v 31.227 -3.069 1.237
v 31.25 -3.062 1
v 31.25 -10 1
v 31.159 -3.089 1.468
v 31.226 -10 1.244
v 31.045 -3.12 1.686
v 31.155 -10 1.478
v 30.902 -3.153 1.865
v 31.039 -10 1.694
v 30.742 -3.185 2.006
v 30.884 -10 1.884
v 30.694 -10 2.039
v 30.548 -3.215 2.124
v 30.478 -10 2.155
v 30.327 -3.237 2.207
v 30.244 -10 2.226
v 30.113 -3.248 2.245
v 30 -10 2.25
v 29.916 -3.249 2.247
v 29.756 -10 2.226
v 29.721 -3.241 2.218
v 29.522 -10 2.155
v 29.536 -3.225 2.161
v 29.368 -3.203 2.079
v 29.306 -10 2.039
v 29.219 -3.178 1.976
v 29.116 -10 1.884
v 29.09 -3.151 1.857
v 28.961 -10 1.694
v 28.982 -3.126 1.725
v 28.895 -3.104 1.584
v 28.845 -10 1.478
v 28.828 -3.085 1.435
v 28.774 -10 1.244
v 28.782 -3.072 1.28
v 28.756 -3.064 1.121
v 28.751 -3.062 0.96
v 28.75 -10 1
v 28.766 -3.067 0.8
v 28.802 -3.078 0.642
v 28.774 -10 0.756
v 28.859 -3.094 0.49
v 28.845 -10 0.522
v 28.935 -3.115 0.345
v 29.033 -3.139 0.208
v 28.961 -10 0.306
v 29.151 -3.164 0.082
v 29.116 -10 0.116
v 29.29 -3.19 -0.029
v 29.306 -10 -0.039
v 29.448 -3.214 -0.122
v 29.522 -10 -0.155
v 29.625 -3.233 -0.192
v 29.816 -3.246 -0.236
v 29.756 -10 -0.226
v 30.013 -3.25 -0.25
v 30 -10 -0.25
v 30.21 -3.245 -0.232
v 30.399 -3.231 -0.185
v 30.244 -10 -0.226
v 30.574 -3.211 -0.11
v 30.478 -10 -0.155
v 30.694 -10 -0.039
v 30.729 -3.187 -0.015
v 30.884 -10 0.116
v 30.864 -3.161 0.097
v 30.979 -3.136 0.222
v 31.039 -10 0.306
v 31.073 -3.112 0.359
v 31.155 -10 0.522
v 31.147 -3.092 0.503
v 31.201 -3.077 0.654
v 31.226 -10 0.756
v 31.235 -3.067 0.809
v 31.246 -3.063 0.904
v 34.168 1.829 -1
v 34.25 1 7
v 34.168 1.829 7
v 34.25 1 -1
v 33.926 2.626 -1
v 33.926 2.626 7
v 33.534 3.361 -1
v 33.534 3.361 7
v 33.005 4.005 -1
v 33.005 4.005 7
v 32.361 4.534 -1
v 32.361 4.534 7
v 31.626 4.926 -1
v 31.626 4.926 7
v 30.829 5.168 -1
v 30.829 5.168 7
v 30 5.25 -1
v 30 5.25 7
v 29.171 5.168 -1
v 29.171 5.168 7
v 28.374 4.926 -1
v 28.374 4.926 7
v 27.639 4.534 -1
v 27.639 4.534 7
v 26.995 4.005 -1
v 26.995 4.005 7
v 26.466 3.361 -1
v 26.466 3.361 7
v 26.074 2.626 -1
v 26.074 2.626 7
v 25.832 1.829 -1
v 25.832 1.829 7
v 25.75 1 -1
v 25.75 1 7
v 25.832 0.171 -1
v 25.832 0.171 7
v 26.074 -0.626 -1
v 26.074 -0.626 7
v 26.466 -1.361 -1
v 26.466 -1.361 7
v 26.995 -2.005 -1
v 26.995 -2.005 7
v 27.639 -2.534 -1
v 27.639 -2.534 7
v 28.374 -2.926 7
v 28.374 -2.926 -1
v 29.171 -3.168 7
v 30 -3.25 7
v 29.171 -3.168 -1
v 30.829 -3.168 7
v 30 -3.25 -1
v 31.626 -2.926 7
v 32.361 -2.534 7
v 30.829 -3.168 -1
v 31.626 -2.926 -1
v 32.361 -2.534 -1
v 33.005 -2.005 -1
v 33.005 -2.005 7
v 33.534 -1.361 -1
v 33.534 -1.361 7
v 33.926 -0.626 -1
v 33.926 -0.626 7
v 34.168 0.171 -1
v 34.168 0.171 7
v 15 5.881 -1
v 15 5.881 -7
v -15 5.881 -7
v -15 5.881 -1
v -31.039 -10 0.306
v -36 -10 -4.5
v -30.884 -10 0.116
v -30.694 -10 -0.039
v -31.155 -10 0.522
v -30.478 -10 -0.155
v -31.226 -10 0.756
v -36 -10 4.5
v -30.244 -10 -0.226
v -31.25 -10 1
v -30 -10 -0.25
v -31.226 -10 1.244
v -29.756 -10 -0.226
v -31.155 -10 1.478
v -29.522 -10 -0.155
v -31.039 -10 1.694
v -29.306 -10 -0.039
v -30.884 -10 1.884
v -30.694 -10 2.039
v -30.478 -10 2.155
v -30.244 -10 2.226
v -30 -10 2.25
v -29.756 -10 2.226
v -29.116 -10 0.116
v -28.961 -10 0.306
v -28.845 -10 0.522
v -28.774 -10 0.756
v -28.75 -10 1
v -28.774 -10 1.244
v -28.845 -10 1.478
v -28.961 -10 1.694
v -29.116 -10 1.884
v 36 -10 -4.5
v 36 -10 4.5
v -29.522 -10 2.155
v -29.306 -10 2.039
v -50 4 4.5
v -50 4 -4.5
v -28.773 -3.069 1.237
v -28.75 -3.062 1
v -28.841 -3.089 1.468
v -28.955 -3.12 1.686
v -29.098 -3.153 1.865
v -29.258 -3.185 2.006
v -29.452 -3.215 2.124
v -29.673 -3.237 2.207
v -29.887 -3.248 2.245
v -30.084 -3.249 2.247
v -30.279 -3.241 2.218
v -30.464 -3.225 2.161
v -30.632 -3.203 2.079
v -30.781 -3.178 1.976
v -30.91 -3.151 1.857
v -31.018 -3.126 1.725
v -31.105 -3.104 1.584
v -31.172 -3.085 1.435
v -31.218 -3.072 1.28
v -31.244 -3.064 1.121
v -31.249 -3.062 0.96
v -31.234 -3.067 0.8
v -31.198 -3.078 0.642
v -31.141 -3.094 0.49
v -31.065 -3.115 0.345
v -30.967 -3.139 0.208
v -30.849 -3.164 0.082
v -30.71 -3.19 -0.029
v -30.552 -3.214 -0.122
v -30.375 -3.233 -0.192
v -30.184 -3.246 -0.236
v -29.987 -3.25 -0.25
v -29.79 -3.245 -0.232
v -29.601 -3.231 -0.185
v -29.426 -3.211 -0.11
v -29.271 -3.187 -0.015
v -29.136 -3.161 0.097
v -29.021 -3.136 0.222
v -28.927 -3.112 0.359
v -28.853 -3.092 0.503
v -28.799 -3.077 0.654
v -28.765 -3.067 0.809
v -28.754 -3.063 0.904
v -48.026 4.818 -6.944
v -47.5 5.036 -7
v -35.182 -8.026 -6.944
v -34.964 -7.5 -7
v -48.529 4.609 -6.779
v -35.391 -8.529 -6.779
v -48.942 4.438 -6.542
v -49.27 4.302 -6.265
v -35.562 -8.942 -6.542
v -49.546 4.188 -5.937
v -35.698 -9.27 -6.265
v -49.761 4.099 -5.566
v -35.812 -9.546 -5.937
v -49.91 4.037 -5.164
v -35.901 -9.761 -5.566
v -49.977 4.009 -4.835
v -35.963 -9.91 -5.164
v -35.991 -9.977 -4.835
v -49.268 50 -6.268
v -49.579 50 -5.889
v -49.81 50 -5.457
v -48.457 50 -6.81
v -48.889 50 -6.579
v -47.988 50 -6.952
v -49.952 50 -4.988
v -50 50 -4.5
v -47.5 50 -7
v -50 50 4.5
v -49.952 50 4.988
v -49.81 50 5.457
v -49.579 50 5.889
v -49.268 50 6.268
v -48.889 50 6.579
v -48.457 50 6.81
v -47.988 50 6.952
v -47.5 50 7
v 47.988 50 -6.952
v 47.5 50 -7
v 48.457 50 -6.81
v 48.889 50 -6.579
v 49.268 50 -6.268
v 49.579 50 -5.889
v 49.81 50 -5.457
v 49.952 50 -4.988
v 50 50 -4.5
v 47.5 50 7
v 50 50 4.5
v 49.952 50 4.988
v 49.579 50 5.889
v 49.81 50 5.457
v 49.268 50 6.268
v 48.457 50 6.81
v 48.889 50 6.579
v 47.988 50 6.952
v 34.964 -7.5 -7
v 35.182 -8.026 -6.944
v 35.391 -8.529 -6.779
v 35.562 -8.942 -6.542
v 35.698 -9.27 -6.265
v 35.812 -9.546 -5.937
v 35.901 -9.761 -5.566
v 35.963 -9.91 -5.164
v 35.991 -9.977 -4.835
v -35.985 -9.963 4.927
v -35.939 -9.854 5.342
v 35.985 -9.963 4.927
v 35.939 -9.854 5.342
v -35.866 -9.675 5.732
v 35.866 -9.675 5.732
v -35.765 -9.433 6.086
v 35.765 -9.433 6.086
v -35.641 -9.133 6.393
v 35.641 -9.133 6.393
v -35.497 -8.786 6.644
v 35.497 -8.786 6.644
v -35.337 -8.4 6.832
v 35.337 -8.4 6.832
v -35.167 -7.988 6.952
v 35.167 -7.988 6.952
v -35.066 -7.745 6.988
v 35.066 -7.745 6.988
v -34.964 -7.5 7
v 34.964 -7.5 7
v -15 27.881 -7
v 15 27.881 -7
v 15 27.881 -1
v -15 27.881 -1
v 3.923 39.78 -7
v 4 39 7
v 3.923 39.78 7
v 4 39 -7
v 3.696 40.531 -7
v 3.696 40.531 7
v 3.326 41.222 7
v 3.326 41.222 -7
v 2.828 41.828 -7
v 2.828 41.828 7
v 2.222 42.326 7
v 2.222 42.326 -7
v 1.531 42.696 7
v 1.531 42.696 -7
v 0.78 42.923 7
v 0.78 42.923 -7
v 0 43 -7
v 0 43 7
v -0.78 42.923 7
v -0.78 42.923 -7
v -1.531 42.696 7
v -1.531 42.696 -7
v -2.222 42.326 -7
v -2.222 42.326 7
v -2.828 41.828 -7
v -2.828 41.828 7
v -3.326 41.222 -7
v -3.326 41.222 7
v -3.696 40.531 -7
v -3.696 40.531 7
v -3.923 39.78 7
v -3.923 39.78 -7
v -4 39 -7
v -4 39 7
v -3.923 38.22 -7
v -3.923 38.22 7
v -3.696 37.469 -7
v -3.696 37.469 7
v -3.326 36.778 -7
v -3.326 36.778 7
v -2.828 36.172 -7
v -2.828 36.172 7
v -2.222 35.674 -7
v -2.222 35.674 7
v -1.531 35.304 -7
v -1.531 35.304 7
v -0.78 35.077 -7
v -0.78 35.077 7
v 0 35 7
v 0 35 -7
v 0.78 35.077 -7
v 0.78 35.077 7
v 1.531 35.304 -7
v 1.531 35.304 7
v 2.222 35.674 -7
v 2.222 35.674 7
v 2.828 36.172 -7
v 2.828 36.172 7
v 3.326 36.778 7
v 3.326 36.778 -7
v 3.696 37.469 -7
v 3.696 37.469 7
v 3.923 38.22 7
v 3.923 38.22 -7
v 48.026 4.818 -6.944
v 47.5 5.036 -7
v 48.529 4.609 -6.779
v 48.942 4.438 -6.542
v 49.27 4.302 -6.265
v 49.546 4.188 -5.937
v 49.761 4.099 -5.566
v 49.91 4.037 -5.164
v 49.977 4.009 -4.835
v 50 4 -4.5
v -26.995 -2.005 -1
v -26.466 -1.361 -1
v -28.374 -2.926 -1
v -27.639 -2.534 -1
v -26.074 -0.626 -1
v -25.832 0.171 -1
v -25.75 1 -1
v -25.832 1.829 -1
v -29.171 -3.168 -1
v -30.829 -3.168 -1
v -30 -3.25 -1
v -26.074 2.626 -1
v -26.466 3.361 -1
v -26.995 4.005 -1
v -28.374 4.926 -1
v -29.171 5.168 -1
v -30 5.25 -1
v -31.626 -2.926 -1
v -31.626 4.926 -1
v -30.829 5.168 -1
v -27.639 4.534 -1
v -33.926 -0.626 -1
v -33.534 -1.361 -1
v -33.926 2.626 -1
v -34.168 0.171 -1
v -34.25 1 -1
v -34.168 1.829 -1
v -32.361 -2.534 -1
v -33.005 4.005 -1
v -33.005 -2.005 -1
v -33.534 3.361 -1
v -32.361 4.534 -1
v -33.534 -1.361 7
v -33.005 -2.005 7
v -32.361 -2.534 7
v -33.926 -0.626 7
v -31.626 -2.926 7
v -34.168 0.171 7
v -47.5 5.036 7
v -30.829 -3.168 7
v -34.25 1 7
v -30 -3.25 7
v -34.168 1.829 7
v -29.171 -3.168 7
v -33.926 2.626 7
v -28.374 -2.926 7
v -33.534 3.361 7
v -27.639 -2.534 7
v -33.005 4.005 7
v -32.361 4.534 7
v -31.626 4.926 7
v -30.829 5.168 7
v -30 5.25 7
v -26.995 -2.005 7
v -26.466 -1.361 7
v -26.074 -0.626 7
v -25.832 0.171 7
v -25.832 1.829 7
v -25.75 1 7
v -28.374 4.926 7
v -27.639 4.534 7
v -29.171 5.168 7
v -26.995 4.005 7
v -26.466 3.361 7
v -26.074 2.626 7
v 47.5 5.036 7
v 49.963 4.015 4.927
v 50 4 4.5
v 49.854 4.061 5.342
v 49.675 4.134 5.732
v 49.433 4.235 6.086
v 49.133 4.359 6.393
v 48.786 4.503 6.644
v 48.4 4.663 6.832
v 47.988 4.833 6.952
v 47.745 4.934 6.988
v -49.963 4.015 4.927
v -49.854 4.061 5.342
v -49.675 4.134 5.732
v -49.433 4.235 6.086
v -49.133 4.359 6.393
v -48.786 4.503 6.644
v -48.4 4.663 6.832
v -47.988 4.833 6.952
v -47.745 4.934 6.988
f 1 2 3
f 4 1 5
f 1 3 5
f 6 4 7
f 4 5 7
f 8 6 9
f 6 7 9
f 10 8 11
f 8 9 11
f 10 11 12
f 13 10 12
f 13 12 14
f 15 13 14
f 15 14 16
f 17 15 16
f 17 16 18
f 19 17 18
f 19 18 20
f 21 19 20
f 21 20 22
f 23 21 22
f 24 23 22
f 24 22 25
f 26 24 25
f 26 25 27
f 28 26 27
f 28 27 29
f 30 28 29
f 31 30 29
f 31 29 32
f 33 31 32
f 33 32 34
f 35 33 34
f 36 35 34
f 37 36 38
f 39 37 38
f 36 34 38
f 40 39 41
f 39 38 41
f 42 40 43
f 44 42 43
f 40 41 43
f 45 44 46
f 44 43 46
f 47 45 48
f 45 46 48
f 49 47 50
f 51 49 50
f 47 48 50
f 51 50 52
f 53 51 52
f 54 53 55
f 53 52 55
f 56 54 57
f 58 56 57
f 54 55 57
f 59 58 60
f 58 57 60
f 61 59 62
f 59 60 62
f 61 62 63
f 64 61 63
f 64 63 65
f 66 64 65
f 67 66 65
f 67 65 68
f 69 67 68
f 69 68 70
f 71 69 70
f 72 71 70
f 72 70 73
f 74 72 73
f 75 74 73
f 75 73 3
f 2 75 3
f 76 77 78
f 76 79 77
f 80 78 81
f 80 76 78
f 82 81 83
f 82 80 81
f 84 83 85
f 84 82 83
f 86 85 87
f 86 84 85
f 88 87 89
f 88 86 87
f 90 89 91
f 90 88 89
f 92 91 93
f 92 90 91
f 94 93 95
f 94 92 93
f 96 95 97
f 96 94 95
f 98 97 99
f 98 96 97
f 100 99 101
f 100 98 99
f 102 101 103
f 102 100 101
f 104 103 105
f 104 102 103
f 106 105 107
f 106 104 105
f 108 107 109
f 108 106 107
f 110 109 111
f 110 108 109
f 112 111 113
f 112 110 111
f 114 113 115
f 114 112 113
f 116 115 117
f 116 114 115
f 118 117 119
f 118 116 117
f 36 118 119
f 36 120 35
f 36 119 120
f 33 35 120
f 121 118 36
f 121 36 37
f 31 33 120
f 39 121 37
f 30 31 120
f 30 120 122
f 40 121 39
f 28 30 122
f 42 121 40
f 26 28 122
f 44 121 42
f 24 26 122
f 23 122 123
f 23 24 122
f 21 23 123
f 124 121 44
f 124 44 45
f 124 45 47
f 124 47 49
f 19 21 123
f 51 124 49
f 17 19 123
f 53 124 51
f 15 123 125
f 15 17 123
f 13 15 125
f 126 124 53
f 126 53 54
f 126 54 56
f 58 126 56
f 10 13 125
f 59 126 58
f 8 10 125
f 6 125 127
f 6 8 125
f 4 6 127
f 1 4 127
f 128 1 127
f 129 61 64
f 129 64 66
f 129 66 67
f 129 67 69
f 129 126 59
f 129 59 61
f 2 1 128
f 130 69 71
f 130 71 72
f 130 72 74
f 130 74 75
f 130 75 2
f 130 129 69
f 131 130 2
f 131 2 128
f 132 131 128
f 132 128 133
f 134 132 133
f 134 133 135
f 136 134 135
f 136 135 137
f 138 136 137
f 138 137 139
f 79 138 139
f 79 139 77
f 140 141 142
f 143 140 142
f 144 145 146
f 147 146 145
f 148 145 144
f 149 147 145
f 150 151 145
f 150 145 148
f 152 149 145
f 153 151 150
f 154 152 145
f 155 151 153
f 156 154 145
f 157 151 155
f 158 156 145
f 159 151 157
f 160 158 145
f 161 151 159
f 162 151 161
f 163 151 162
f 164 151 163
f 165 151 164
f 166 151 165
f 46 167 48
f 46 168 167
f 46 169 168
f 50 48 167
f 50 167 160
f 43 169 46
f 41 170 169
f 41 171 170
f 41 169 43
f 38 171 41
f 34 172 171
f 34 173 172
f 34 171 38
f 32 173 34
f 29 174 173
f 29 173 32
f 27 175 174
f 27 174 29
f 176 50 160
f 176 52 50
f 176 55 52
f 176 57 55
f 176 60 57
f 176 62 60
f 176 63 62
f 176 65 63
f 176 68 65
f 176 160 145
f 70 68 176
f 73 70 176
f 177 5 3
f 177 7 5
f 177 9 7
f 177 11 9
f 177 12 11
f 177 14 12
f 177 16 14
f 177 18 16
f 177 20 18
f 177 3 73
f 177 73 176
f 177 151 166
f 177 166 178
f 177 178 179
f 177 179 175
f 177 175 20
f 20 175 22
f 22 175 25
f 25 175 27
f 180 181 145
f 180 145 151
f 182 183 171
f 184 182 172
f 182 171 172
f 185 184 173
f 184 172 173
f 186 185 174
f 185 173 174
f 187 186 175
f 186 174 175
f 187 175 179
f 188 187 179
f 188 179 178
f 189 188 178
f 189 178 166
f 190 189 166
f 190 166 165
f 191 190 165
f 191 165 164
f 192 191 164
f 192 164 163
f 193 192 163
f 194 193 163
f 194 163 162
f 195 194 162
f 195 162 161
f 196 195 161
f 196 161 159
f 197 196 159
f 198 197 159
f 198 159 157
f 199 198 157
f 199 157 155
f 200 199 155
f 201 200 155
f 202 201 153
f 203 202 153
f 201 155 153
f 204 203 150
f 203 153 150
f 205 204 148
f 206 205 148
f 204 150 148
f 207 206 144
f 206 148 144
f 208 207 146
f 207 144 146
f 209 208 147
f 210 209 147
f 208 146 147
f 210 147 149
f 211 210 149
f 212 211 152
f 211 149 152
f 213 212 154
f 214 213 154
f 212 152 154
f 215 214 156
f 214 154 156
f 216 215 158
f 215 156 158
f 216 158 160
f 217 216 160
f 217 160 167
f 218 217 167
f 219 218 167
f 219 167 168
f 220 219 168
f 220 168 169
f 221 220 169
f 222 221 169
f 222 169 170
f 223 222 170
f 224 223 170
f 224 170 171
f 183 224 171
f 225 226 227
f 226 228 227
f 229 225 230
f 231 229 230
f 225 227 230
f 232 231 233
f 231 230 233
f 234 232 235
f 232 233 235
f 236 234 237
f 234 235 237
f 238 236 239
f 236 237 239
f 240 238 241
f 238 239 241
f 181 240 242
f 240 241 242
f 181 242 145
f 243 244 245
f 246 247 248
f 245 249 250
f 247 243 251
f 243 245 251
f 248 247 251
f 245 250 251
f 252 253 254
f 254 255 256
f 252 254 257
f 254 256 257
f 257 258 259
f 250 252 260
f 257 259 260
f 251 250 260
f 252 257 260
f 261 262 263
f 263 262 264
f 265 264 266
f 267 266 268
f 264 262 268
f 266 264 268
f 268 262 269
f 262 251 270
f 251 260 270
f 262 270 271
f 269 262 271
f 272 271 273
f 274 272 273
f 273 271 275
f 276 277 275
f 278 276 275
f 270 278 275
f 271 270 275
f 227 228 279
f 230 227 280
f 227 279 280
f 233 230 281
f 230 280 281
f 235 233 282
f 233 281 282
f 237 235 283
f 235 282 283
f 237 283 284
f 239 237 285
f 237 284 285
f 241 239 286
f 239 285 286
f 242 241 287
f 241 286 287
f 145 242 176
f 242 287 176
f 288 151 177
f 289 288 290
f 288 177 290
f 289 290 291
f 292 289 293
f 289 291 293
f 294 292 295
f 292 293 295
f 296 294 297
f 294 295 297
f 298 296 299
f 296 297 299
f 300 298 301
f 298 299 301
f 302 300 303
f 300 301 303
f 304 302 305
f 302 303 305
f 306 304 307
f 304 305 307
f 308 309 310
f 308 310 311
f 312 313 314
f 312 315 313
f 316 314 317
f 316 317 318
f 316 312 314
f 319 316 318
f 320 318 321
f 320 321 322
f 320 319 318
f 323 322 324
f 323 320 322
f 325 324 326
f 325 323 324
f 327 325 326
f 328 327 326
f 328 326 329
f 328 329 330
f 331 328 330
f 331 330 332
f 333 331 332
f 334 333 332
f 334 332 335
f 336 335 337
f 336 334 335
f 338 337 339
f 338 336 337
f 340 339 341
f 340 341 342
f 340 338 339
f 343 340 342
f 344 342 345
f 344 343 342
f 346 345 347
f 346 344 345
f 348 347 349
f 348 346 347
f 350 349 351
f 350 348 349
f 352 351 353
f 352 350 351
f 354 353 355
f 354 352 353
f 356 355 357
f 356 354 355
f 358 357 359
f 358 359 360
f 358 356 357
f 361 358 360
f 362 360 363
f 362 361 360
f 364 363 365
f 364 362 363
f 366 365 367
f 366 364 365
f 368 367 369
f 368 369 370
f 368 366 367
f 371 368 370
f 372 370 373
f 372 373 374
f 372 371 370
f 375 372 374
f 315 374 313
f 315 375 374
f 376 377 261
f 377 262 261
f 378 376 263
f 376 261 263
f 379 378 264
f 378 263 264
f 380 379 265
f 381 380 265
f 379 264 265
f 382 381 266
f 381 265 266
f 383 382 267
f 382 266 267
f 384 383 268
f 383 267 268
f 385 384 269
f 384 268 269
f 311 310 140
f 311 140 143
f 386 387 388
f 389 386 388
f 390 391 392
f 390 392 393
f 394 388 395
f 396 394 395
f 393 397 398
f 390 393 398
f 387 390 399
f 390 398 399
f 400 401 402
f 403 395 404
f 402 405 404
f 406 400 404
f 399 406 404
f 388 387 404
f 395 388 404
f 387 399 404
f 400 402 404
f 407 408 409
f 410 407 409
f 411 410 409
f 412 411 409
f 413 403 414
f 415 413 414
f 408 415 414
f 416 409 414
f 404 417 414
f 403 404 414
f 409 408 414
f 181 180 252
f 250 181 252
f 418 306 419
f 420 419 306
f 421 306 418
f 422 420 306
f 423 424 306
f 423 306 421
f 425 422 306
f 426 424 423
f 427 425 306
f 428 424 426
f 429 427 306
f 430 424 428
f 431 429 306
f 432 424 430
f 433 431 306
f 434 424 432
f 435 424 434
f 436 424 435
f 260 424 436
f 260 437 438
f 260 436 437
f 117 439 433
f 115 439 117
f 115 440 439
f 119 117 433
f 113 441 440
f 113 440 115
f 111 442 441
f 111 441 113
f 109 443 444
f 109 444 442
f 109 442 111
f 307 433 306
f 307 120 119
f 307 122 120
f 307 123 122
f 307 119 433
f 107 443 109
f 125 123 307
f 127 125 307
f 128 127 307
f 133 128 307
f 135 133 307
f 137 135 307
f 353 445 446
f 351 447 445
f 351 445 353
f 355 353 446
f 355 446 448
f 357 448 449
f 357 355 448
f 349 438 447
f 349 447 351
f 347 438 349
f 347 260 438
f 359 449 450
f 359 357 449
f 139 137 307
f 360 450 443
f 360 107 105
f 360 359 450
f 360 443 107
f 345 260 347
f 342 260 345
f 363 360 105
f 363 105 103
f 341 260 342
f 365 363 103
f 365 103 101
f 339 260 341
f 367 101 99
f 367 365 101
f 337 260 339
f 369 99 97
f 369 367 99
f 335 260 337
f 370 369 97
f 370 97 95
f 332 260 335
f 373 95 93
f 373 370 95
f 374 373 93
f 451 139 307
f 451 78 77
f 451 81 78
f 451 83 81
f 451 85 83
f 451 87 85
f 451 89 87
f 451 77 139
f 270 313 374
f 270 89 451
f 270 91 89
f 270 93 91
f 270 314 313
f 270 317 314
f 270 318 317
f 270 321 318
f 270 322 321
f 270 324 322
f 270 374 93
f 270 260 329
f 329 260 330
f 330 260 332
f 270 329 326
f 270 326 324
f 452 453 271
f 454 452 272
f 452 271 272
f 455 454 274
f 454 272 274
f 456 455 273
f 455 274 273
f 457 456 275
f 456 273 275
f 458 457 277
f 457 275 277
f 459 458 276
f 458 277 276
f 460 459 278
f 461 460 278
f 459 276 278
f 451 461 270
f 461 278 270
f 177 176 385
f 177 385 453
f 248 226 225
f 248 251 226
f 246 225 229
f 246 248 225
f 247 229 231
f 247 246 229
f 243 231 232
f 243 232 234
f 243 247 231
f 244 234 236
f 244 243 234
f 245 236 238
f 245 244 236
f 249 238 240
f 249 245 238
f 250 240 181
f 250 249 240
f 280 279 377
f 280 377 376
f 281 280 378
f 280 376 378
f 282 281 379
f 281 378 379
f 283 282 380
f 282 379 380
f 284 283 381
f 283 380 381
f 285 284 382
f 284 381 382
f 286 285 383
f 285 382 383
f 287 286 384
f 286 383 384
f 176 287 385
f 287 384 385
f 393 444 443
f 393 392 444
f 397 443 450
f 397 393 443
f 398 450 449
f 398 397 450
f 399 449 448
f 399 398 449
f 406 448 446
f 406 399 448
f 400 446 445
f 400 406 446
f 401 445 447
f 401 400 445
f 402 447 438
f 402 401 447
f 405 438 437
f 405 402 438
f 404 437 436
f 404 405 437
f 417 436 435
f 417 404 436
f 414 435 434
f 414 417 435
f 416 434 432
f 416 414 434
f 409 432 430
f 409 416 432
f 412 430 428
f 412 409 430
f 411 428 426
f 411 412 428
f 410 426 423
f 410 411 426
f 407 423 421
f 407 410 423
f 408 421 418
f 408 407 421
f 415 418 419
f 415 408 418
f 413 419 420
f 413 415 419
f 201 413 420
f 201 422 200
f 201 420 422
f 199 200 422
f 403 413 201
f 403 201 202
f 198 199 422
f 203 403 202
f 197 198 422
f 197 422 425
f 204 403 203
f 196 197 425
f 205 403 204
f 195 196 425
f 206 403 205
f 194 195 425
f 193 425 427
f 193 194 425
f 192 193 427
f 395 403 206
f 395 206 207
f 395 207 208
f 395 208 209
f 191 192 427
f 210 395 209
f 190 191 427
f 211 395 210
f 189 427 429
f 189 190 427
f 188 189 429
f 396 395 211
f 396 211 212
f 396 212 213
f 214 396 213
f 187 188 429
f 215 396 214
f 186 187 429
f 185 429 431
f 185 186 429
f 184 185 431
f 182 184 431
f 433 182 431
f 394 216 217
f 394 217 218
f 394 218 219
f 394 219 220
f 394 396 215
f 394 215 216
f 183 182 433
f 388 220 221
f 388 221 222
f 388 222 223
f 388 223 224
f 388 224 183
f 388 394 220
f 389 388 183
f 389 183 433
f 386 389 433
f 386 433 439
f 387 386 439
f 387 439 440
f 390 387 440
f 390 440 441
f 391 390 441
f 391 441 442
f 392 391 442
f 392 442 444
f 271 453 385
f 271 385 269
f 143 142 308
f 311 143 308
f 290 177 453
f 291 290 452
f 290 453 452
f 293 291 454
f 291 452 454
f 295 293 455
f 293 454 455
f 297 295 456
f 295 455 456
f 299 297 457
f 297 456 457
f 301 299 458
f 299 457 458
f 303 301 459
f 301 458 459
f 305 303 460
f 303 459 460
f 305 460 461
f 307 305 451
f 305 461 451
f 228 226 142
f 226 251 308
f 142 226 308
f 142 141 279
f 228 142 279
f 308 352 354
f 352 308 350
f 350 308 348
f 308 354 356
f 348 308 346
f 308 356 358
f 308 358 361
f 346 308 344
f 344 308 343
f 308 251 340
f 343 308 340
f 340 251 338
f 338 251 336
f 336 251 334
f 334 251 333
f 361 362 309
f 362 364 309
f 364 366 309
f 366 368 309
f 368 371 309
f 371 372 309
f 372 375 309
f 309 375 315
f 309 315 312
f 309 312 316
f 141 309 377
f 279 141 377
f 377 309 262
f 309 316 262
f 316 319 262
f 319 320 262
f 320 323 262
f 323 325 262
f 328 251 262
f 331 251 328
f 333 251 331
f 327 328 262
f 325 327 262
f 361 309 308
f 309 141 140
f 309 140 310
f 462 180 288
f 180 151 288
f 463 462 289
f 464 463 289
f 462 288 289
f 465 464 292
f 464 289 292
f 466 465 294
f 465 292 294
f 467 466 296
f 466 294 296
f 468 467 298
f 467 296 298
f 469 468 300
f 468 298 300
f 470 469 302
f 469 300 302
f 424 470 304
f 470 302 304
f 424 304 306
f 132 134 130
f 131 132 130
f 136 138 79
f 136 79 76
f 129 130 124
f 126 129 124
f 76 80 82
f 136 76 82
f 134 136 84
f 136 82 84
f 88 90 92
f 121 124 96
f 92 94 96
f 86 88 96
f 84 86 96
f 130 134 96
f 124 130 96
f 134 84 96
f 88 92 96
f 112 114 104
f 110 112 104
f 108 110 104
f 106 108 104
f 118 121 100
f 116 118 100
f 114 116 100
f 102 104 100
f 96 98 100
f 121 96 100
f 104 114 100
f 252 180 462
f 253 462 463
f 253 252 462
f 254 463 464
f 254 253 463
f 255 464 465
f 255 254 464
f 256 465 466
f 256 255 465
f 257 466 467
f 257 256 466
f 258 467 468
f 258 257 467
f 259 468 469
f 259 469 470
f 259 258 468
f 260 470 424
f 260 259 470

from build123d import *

# Parameters (mm, degrees)
SKETCH1_W           = 100
SKETCH1_H           = 60
SKETCH1_R           = 4.25
SKETCH1_R_2         = 4
BOSS_EXTRUDE1_DEPTH = 7
SKETCH2_R           = 6.457332118
BOSS_EXTRUDE2_DEPTH = 6
CHAMFER1_SIZE       = 14
FILLET2_R           = 2.5
SKETCH3_W           = 30
SKETCH3_H           = 22
CUT_EXTRUDE1_DEPTH  = 6
SKETCH4_R           = 1.25
CUT_EXTRUDE2_DEPTH  = 12


with BuildPart() as part:
    # Sketch1 → Boss-Extrude1 (new body, symmetric)
    with BuildSketch(Plane.XY):
        with Locations((0, 20)):
            Rectangle(SKETCH1_W, SKETCH1_H)
        with Locations((30, 1)):
            Circle(SKETCH1_R, mode=Mode.SUBTRACT)
        with Locations((-30, 1)):
            Circle(SKETCH1_R, mode=Mode.SUBTRACT)
        with Locations((0, 39)):
            Circle(SKETCH1_R_2, mode=Mode.SUBTRACT)
    extrude(amount=BOSS_EXTRUDE1_DEPTH, both=True)

    # Sketch2 → Boss-Extrude2 (add)
    with BuildSketch(Plane(origin=(0, 0, -7), x_dir=(-1, 0, 0), z_dir=(0, 0, -1))):
        with Locations((-30, 1)):
            Circle(SKETCH2_R)
        with Locations((30, 1)):
            Circle(SKETCH2_R)
    extrude(amount=-BOSS_EXTRUDE2_DEPTH)

    # Chamfer1
    chamfer1_edges = [part.edges().sort_by_distance(p)[0] for p in [
        (50, -10, 0),
        (-50, -10, 0),
    ]]
    chamfer(chamfer1_edges, length=CHAMFER1_SIZE)

    # Fillet2
    fillet2_edges = [part.edges().sort_by_distance(p)[0] for p in [
        (0, -10, -7),
        (0, -10, 7),
        (-50, 27, 7),
        (50, 27, -7),
        (43, -3, -7),
        (-43, -3, -7),
        (50, 27, 7),
        (43, -3, 7),
        (-43, -3, 7),
        (-50, 27, -7),
    ]]
    fillet(fillet2_edges, radius=FILLET2_R)

    # Sketch3 → Cut-Extrude1 (cut)
    with BuildSketch(Plane(origin=(0, 0, -7), x_dir=(-1, 0, 0), z_dir=(0, 0, -1))):
        with Locations((0, 16.881077189)):
            Rectangle(SKETCH3_W, SKETCH3_H)
    extrude(amount=-CUT_EXTRUDE1_DEPTH, mode=Mode.SUBTRACT)

    # Sketch4 → Cut-Extrude2 (cut)
    with BuildSketch(Plane.XZ.offset(10)):
        with Locations((30, 1)):
            Circle(SKETCH4_R)
        with Locations((-30, 1)):
            Circle(SKETCH4_R)
    extrude(amount=-CUT_EXTRUDE2_DEPTH, mode=Mode.SUBTRACT)


solid = part.part
